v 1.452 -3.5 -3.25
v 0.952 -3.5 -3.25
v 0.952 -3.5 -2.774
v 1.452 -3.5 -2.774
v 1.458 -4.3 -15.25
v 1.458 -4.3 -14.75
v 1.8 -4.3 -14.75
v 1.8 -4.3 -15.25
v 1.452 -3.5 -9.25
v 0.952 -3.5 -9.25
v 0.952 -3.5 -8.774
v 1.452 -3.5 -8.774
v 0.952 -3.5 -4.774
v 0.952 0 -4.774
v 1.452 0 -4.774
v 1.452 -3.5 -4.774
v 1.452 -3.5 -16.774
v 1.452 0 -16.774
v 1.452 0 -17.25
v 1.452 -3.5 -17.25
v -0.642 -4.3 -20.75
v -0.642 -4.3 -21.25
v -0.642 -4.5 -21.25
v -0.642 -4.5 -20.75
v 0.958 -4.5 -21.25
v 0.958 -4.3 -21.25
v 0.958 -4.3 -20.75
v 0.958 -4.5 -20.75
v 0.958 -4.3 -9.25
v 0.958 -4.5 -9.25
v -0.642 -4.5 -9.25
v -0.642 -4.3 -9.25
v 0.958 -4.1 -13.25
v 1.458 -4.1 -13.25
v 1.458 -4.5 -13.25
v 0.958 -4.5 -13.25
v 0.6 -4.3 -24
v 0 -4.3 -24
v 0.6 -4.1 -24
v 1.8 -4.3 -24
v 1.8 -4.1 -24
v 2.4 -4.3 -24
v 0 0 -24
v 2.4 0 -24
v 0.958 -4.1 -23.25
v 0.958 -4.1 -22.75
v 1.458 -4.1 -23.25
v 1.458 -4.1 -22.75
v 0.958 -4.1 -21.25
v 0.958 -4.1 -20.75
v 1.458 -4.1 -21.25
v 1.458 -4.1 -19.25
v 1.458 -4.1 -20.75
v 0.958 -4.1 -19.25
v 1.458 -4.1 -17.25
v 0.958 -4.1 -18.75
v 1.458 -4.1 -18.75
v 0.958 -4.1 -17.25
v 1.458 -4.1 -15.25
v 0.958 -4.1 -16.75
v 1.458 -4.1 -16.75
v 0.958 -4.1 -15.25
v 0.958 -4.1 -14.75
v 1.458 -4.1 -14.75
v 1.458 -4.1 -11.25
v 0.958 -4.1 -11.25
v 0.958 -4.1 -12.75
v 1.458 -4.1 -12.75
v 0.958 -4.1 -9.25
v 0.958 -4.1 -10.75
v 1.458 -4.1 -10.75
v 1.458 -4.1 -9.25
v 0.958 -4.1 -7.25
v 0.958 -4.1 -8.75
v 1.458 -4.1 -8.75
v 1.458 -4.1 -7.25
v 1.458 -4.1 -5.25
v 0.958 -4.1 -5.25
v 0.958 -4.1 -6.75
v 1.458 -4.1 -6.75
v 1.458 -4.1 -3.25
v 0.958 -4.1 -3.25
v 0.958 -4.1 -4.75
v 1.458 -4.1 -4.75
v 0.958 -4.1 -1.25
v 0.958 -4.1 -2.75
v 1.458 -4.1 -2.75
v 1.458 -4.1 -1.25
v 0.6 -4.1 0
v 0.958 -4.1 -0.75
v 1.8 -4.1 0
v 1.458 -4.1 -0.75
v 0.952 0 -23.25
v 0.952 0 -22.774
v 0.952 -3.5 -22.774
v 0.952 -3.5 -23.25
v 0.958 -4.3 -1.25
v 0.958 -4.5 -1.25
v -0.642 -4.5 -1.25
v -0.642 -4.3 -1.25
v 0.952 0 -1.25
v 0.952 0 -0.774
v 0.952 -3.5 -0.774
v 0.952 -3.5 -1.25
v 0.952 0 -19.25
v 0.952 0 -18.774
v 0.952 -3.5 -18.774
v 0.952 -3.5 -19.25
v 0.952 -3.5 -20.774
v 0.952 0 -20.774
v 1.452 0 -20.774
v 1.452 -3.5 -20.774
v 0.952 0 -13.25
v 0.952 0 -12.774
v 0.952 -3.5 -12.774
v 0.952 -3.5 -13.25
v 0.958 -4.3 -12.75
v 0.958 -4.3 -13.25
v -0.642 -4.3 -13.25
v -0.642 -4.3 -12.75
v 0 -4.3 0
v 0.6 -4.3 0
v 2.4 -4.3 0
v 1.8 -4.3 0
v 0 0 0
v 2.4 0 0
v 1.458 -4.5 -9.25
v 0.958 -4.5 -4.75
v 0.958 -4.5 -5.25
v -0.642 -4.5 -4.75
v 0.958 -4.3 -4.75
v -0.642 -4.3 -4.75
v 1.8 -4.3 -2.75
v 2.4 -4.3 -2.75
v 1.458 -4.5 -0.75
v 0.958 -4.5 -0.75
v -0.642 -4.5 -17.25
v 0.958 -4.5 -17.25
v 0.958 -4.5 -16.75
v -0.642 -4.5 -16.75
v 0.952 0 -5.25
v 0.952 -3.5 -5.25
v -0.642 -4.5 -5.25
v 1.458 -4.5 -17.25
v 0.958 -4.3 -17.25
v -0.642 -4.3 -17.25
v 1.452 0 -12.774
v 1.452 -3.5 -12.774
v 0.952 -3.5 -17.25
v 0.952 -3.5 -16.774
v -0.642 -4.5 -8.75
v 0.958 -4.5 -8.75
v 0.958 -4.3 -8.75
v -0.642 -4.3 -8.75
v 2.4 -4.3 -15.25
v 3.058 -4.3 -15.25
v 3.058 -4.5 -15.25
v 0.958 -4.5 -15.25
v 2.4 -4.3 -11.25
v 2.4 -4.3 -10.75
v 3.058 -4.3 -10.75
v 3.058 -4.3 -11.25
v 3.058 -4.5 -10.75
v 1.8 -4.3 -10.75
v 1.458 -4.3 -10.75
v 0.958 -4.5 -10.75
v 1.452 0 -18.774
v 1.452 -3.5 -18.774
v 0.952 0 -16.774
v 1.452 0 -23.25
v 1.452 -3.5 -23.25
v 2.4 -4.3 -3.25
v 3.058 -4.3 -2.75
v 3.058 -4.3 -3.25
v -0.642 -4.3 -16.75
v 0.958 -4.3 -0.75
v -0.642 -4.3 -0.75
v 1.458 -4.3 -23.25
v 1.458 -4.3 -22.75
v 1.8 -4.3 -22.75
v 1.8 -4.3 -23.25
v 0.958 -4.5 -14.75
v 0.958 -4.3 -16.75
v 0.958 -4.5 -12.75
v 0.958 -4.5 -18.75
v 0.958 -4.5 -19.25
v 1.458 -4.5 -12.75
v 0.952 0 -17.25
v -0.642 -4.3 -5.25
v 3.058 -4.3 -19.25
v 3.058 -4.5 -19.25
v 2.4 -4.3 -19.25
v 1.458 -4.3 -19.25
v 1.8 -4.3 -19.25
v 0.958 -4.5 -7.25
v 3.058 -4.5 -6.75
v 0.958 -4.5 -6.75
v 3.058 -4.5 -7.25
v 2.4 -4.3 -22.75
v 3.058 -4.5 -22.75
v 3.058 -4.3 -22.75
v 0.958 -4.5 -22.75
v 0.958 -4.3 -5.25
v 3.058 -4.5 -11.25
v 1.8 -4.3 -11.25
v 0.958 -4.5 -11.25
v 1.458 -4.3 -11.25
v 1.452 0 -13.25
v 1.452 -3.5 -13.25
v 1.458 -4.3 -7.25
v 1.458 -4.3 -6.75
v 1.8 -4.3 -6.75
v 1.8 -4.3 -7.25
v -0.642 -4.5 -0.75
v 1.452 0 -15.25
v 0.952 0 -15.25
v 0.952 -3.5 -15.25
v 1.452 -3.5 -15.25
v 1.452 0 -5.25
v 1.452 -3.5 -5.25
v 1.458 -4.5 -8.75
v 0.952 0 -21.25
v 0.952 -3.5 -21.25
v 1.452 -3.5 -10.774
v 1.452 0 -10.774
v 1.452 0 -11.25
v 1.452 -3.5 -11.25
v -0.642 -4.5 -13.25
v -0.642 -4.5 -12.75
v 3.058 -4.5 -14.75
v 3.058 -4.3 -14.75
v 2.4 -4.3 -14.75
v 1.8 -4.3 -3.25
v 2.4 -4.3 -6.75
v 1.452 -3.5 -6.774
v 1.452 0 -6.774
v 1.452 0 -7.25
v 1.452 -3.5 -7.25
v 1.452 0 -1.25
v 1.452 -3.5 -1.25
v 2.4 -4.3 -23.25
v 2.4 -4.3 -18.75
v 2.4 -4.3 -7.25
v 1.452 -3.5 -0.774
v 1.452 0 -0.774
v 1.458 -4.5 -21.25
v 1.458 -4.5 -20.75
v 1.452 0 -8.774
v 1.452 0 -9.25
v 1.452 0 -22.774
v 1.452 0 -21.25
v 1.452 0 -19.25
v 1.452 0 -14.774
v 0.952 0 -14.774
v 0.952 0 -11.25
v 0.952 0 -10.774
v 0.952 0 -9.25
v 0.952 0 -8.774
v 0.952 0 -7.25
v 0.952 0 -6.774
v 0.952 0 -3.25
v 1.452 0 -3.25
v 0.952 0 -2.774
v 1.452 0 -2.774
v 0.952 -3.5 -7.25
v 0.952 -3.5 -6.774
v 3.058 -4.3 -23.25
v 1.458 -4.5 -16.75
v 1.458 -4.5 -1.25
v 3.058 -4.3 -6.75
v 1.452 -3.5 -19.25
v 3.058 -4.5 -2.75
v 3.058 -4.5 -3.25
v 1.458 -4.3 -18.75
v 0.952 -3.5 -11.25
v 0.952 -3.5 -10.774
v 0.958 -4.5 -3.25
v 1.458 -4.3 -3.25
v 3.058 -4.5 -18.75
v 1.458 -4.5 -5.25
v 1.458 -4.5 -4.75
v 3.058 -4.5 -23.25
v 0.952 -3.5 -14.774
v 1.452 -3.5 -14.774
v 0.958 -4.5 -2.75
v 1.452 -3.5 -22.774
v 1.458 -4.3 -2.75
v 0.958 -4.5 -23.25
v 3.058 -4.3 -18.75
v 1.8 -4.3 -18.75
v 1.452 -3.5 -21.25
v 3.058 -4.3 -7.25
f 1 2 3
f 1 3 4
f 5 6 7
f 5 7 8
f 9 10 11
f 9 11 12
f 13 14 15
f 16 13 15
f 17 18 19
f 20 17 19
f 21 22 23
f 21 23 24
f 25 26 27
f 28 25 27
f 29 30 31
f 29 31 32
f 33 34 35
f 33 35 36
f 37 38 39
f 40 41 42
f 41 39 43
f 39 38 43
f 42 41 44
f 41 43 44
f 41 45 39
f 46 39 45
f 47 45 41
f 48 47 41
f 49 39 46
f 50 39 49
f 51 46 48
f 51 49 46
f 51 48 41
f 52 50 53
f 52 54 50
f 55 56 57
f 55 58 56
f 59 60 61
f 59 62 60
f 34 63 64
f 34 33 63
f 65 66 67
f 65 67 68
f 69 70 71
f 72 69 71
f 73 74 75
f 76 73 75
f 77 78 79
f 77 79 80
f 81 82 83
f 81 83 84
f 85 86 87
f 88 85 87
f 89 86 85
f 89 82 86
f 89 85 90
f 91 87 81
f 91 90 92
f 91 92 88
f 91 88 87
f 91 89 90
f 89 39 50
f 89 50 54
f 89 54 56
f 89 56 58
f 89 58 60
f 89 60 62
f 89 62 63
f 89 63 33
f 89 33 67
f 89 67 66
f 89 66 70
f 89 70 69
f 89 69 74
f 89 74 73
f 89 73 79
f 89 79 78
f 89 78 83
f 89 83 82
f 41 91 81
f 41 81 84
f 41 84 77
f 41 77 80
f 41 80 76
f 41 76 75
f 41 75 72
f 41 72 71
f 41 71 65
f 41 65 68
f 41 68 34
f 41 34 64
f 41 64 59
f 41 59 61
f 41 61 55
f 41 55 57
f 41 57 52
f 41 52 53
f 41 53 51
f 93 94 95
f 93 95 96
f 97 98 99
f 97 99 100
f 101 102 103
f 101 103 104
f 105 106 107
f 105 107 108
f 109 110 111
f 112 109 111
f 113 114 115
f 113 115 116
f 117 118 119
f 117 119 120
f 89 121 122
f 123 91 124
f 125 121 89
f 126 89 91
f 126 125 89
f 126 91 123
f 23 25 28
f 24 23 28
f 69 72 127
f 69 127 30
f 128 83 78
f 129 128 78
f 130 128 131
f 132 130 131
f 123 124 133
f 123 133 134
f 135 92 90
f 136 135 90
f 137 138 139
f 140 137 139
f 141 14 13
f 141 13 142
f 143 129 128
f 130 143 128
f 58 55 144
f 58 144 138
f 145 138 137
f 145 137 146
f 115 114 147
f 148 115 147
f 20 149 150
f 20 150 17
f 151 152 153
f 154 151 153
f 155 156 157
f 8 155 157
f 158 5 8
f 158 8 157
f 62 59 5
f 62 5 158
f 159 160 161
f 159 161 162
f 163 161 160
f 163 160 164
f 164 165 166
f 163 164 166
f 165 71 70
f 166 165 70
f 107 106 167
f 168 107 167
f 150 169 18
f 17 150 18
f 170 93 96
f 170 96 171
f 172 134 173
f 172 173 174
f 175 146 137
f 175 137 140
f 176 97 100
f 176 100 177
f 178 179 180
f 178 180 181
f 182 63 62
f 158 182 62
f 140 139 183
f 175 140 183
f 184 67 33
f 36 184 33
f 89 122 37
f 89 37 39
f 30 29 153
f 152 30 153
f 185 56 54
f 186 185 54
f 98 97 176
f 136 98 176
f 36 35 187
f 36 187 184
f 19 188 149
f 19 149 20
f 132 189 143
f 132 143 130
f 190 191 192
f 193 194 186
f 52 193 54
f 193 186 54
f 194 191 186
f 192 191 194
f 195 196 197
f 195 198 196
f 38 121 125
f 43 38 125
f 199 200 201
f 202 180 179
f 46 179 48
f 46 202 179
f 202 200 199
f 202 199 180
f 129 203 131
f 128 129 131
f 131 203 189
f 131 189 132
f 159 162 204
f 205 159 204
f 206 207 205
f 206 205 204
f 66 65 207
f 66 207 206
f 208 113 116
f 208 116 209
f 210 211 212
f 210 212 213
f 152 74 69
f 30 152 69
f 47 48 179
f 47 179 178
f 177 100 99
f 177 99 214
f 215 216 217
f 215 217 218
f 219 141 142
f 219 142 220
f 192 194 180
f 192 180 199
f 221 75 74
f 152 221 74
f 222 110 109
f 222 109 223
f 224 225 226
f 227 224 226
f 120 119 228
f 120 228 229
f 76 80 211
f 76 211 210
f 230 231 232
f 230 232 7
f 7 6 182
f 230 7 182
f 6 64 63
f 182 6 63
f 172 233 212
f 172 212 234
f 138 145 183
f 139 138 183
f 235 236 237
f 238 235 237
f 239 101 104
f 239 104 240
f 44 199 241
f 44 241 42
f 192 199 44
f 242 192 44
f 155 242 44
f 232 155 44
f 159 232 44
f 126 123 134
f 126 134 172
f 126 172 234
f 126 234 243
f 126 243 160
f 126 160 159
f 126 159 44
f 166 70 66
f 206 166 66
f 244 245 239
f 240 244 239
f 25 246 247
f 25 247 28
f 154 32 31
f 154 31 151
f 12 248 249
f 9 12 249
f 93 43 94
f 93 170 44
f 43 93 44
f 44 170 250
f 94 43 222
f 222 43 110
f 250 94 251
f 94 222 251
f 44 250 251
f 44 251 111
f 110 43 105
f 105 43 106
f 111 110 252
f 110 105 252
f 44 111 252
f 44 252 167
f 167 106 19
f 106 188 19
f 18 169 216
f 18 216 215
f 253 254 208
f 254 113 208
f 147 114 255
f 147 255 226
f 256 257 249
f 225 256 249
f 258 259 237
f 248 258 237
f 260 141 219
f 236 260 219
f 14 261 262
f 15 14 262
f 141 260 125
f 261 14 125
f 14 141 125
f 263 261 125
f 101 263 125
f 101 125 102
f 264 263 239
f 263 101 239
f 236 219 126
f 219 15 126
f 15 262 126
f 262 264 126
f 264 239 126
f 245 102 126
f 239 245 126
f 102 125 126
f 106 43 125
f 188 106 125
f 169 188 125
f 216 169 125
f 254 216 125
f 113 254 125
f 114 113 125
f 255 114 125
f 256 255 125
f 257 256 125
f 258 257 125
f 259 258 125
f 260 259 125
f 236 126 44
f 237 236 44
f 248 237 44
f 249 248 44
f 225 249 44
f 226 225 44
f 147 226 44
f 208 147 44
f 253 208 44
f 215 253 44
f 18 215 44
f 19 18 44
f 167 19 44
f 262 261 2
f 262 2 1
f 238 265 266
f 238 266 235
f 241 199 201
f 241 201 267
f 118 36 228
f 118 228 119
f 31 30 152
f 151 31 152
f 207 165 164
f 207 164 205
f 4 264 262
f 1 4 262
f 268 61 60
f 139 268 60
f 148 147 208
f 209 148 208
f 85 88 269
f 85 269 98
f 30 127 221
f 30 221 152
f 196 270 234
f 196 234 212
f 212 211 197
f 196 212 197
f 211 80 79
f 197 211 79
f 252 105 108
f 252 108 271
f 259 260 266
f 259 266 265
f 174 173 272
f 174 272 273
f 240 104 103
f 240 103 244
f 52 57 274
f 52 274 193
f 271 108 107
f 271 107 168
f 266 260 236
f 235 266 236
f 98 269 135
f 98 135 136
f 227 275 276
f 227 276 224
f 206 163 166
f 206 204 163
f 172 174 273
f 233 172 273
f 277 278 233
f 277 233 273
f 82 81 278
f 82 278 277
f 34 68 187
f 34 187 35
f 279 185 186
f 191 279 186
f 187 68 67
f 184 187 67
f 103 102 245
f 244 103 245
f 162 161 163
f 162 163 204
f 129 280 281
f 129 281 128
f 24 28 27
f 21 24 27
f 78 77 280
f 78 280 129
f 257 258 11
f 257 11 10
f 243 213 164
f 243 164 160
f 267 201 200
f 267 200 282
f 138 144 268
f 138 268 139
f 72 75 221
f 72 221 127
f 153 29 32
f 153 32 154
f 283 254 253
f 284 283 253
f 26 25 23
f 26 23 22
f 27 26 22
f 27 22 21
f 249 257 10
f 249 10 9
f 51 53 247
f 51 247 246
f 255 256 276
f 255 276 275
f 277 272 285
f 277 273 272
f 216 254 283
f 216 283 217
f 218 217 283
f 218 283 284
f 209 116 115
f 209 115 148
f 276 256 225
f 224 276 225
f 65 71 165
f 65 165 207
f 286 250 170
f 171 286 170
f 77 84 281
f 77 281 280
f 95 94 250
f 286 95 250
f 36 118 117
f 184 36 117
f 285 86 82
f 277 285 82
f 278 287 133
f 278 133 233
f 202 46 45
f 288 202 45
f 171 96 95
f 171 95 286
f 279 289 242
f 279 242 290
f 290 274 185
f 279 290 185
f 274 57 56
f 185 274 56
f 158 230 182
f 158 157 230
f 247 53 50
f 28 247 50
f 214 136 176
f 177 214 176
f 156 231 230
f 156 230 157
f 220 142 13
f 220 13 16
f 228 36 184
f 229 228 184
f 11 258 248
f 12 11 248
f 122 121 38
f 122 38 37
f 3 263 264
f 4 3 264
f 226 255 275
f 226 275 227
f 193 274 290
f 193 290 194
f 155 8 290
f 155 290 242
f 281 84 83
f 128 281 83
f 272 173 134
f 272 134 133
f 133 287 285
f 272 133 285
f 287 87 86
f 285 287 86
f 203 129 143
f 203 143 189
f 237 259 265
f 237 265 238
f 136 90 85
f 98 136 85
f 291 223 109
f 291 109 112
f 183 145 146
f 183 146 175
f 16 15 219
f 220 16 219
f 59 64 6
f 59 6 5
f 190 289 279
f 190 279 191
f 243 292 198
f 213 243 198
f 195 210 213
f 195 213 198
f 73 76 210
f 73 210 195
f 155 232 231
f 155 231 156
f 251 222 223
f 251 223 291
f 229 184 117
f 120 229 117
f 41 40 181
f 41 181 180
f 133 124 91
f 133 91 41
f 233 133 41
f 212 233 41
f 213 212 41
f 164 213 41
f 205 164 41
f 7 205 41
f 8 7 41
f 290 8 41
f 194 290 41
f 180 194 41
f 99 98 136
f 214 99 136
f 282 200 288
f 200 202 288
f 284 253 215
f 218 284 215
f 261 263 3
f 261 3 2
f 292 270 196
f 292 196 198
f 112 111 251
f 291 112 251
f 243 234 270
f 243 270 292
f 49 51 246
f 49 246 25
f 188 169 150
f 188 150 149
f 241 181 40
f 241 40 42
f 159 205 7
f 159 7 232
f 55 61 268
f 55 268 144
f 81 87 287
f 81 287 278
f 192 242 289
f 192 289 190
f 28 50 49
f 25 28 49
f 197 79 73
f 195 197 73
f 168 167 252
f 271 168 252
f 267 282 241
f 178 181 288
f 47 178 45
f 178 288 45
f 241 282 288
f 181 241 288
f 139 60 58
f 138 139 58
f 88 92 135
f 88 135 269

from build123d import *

# Parameters (mm, degrees)
SKETCH1_W           = 2.4
SKETCH1_H           = 4.3
BOSS_EXTRUDE1_DEPTH = 24
SKETCH2_W           = 1.2
SKETCH2_H           = 0.2
CUT_EXTRUDE1_DEPTH  = 25
SKETCH3_W           = 0.5
SKETCH3_H           = 0.5
BOSS_EXTRUDE2_DEPTH = 0.4
SKETCH7_W           = 0.5
SKETCH7_H           = 0.475666933
CUT_EXTRUDE2_DEPTH  = 3.5
SKETCH_1_W          = 0.5
SKETCH_1_H          = 0.2
EXTRUDE_1_DEPTH     = 1.6
SKETCH_2_W          = 0.5
SKETCH_2_H          = 0.2
EXTRUDE_2_DEPTH     = 1.6
EXTRUDE_2_2_DEPTH   = 1.6
EXTRUDE_2_3_DEPTH   = 1.6
EXTRUDE_2_4_DEPTH   = 1.6
EXTRUDE_2_5_DEPTH   = 1.6
EXTRUDE_2_6_DEPTH   = 1.6


with BuildPart() as part:
    # Sketch1 → Boss-Extrude1 (new body)
    with BuildSketch(Plane.XY):
        with Locations((1.2, -2.15)):
            Rectangle(SKETCH1_W, SKETCH1_H)
    extrude(amount=-BOSS_EXTRUDE1_DEPTH)

    # Sketch2 → Cut-Extrude1 (cut, through all)
    with BuildSketch(Plane.XY):
        with Locations((1.2, -4.2)):
            Rectangle(SKETCH2_W, SKETCH2_H)
    extrude(amount=-CUT_EXTRUDE1_DEPTH, mode=Mode.SUBTRACT)

    # Sketch3 → Boss-Extrude2 (add)
    with BuildSketch(Plane(origin=(0, -4.1, 0), x_dir=(-1, 0, 0), z_dir=(0, -1, 0))):
        with Locations((-1.207554148, 1)):
            Rectangle(SKETCH3_W, SKETCH3_H)
        with Locations((-1.207554148, 3)):
            Rectangle(SKETCH3_W, SKETCH3_H)
        with Locations((-1.207554148, 5)):
            Rectangle(SKETCH3_W, SKETCH3_H)
        with Locations((-1.207554148, 7)):
            Rectangle(SKETCH3_W, SKETCH3_H)
        with Locations((-1.207554148, 9)):
            Rectangle(SKETCH3_W, SKETCH3_H)
        with Locations((-1.207554148, 11)):
            Rectangle(SKETCH3_W, SKETCH3_H)
        with Locations((-1.207554148, 13)):
            Rectangle(SKETCH3_W, SKETCH3_H)
        with Locations((-1.207554148, 15)):
            Rectangle(SKETCH3_W, SKETCH3_H)
        with Locations((-1.207554148, 17)):
            Rectangle(SKETCH3_W, SKETCH3_H)
        with Locations((-1.207554148, 19)):
            Rectangle(SKETCH3_W, SKETCH3_H)
        with Locations((-1.207554148, 21)):
            Rectangle(SKETCH3_W, SKETCH3_H)
        with Locations((-1.207554148, 23)):
            Rectangle(SKETCH3_W, SKETCH3_H)
    extrude(amount=BOSS_EXTRUDE2_DEPTH)

    # Sketch7 → Cut-Extrude2 (cut)
    with BuildSketch(Plane(origin=(0, 0, 0), x_dir=(1, 0, 0), z_dir=(0, 1, 0))):
        with Locations((1.201899432, 21.012166534)):
            Rectangle(SKETCH7_W, SKETCH7_H)
        with Locations((1.201899432, 23.012166534)):
            Rectangle(SKETCH7_W, SKETCH7_H)
        with Locations((1.201899432, 19.012166534)):
            Rectangle(SKETCH7_W, SKETCH7_H)
        with Locations((1.201899432, 17.012166534)):
            Rectangle(SKETCH7_W, SKETCH7_H)
        with Locations((1.201899432, 15.012166534)):
            Rectangle(SKETCH7_W, SKETCH7_H)
        with Locations((1.201899432, 13.012166534)):
            Rectangle(SKETCH7_W, SKETCH7_H)
        with Locations((1.201899432, 11.012166534)):
            Rectangle(SKETCH7_W, SKETCH7_H)
        with Locations((1.201899432, 9.012166534)):
            Rectangle(SKETCH7_W, SKETCH7_H)
        with Locations((1.201899432, 7.012166534)):
            Rectangle(SKETCH7_W, SKETCH7_H)
        with Locations((1.201899432, 5.012166534)):
            Rectangle(SKETCH7_W, SKETCH7_H)
        with Locations((1.201899432, 3.012166534)):
            Rectangle(SKETCH7_W, SKETCH7_H)
        with Locations((1.201899432, 1.012166534)):
            Rectangle(SKETCH7_W, SKETCH7_H)
    extrude(amount=-CUT_EXTRUDE2_DEPTH, mode=Mode.SUBTRACT)

    # ｽｹｯﾁ1 → ﾎﾞｽ - 押し出し1 (add)
    with BuildSketch(Plane(origin=(1.457554148, 0, 0), x_dir=(0, 0, -1), z_dir=(1, 0, 0))):
        with Locations((23, -4.4)):
            Rectangle(SKETCH_1_W, SKETCH_1_H)
        with Locations((19, -4.4)):
            Rectangle(SKETCH_1_W, SKETCH_1_H)
        with Locations((15, -4.4)):
            Rectangle(SKETCH_1_W, SKETCH_1_H)
        with Locations((11, -4.4)):
            Rectangle(SKETCH_1_W, SKETCH_1_H)
        with Locations((7, -4.4)):
            Rectangle(SKETCH_1_W, SKETCH_1_H)
        with Locations((3, -4.4)):
            Rectangle(SKETCH_1_W, SKETCH_1_H)
    extrude(amount=EXTRUDE_1_DEPTH)


with BuildPart() as body_2:
    # ｽｹｯﾁ2 → ﾎﾞｽ - 押し出し2 (new body)
    with BuildSketch(Plane.ZY.offset(-0.957554148)):
        with Locations((-1, -4.4)):
            Rectangle(SKETCH_2_W, SKETCH_2_H)
    extrude(amount=EXTRUDE_2_DEPTH)


with BuildPart() as body_3:
    # ｽｹｯﾁ2 → Extrude 2 2 (new body)
    with BuildSketch(Plane.ZY.offset(-0.957554148)):
        with Locations((-5, -4.4)):
            Rectangle(SKETCH_2_W, SKETCH_2_H)
    extrude(amount=EXTRUDE_2_2_DEPTH)


with BuildPart() as body_4:
    # ｽｹｯﾁ2 → Extrude 2 3 (new body)
    with BuildSketch(Plane.ZY.offset(-0.957554148)):
        with Locations((-9, -4.4)):
            Rectangle(SKETCH_2_W, SKETCH_2_H)
    extrude(amount=EXTRUDE_2_3_DEPTH)


with BuildPart() as body_5:
    # ｽｹｯﾁ2 → Extrude 2 4 (new body)
    with BuildSketch(Plane.ZY.offset(-0.957554148)):
        with Locations((-13, -4.4)):
            Rectangle(SKETCH_2_W, SKETCH_2_H)
    extrude(amount=EXTRUDE_2_4_DEPTH)


with BuildPart() as body_6:
    # ｽｹｯﾁ2 → Extrude 2 5 (new body)
    with BuildSketch(Plane.ZY.offset(-0.957554148)):
        with Locations((-17, -4.4)):
            Rectangle(SKETCH_2_W, SKETCH_2_H)
    extrude(amount=EXTRUDE_2_5_DEPTH)


with BuildPart() as body_7:
    # ｽｹｯﾁ2 → Extrude 2 6 (new body)
    with BuildSketch(Plane.ZY.offset(-0.957554148)):
        with Locations((-21, -4.4)):
            Rectangle(SKETCH_2_W, SKETCH_2_H)
    extrude(amount=EXTRUDE_2_6_DEPTH)


solid = Compound([part.part, body_2.part, body_3.part, body_4.part, body_5.part, body_6.part, body_7.part])
